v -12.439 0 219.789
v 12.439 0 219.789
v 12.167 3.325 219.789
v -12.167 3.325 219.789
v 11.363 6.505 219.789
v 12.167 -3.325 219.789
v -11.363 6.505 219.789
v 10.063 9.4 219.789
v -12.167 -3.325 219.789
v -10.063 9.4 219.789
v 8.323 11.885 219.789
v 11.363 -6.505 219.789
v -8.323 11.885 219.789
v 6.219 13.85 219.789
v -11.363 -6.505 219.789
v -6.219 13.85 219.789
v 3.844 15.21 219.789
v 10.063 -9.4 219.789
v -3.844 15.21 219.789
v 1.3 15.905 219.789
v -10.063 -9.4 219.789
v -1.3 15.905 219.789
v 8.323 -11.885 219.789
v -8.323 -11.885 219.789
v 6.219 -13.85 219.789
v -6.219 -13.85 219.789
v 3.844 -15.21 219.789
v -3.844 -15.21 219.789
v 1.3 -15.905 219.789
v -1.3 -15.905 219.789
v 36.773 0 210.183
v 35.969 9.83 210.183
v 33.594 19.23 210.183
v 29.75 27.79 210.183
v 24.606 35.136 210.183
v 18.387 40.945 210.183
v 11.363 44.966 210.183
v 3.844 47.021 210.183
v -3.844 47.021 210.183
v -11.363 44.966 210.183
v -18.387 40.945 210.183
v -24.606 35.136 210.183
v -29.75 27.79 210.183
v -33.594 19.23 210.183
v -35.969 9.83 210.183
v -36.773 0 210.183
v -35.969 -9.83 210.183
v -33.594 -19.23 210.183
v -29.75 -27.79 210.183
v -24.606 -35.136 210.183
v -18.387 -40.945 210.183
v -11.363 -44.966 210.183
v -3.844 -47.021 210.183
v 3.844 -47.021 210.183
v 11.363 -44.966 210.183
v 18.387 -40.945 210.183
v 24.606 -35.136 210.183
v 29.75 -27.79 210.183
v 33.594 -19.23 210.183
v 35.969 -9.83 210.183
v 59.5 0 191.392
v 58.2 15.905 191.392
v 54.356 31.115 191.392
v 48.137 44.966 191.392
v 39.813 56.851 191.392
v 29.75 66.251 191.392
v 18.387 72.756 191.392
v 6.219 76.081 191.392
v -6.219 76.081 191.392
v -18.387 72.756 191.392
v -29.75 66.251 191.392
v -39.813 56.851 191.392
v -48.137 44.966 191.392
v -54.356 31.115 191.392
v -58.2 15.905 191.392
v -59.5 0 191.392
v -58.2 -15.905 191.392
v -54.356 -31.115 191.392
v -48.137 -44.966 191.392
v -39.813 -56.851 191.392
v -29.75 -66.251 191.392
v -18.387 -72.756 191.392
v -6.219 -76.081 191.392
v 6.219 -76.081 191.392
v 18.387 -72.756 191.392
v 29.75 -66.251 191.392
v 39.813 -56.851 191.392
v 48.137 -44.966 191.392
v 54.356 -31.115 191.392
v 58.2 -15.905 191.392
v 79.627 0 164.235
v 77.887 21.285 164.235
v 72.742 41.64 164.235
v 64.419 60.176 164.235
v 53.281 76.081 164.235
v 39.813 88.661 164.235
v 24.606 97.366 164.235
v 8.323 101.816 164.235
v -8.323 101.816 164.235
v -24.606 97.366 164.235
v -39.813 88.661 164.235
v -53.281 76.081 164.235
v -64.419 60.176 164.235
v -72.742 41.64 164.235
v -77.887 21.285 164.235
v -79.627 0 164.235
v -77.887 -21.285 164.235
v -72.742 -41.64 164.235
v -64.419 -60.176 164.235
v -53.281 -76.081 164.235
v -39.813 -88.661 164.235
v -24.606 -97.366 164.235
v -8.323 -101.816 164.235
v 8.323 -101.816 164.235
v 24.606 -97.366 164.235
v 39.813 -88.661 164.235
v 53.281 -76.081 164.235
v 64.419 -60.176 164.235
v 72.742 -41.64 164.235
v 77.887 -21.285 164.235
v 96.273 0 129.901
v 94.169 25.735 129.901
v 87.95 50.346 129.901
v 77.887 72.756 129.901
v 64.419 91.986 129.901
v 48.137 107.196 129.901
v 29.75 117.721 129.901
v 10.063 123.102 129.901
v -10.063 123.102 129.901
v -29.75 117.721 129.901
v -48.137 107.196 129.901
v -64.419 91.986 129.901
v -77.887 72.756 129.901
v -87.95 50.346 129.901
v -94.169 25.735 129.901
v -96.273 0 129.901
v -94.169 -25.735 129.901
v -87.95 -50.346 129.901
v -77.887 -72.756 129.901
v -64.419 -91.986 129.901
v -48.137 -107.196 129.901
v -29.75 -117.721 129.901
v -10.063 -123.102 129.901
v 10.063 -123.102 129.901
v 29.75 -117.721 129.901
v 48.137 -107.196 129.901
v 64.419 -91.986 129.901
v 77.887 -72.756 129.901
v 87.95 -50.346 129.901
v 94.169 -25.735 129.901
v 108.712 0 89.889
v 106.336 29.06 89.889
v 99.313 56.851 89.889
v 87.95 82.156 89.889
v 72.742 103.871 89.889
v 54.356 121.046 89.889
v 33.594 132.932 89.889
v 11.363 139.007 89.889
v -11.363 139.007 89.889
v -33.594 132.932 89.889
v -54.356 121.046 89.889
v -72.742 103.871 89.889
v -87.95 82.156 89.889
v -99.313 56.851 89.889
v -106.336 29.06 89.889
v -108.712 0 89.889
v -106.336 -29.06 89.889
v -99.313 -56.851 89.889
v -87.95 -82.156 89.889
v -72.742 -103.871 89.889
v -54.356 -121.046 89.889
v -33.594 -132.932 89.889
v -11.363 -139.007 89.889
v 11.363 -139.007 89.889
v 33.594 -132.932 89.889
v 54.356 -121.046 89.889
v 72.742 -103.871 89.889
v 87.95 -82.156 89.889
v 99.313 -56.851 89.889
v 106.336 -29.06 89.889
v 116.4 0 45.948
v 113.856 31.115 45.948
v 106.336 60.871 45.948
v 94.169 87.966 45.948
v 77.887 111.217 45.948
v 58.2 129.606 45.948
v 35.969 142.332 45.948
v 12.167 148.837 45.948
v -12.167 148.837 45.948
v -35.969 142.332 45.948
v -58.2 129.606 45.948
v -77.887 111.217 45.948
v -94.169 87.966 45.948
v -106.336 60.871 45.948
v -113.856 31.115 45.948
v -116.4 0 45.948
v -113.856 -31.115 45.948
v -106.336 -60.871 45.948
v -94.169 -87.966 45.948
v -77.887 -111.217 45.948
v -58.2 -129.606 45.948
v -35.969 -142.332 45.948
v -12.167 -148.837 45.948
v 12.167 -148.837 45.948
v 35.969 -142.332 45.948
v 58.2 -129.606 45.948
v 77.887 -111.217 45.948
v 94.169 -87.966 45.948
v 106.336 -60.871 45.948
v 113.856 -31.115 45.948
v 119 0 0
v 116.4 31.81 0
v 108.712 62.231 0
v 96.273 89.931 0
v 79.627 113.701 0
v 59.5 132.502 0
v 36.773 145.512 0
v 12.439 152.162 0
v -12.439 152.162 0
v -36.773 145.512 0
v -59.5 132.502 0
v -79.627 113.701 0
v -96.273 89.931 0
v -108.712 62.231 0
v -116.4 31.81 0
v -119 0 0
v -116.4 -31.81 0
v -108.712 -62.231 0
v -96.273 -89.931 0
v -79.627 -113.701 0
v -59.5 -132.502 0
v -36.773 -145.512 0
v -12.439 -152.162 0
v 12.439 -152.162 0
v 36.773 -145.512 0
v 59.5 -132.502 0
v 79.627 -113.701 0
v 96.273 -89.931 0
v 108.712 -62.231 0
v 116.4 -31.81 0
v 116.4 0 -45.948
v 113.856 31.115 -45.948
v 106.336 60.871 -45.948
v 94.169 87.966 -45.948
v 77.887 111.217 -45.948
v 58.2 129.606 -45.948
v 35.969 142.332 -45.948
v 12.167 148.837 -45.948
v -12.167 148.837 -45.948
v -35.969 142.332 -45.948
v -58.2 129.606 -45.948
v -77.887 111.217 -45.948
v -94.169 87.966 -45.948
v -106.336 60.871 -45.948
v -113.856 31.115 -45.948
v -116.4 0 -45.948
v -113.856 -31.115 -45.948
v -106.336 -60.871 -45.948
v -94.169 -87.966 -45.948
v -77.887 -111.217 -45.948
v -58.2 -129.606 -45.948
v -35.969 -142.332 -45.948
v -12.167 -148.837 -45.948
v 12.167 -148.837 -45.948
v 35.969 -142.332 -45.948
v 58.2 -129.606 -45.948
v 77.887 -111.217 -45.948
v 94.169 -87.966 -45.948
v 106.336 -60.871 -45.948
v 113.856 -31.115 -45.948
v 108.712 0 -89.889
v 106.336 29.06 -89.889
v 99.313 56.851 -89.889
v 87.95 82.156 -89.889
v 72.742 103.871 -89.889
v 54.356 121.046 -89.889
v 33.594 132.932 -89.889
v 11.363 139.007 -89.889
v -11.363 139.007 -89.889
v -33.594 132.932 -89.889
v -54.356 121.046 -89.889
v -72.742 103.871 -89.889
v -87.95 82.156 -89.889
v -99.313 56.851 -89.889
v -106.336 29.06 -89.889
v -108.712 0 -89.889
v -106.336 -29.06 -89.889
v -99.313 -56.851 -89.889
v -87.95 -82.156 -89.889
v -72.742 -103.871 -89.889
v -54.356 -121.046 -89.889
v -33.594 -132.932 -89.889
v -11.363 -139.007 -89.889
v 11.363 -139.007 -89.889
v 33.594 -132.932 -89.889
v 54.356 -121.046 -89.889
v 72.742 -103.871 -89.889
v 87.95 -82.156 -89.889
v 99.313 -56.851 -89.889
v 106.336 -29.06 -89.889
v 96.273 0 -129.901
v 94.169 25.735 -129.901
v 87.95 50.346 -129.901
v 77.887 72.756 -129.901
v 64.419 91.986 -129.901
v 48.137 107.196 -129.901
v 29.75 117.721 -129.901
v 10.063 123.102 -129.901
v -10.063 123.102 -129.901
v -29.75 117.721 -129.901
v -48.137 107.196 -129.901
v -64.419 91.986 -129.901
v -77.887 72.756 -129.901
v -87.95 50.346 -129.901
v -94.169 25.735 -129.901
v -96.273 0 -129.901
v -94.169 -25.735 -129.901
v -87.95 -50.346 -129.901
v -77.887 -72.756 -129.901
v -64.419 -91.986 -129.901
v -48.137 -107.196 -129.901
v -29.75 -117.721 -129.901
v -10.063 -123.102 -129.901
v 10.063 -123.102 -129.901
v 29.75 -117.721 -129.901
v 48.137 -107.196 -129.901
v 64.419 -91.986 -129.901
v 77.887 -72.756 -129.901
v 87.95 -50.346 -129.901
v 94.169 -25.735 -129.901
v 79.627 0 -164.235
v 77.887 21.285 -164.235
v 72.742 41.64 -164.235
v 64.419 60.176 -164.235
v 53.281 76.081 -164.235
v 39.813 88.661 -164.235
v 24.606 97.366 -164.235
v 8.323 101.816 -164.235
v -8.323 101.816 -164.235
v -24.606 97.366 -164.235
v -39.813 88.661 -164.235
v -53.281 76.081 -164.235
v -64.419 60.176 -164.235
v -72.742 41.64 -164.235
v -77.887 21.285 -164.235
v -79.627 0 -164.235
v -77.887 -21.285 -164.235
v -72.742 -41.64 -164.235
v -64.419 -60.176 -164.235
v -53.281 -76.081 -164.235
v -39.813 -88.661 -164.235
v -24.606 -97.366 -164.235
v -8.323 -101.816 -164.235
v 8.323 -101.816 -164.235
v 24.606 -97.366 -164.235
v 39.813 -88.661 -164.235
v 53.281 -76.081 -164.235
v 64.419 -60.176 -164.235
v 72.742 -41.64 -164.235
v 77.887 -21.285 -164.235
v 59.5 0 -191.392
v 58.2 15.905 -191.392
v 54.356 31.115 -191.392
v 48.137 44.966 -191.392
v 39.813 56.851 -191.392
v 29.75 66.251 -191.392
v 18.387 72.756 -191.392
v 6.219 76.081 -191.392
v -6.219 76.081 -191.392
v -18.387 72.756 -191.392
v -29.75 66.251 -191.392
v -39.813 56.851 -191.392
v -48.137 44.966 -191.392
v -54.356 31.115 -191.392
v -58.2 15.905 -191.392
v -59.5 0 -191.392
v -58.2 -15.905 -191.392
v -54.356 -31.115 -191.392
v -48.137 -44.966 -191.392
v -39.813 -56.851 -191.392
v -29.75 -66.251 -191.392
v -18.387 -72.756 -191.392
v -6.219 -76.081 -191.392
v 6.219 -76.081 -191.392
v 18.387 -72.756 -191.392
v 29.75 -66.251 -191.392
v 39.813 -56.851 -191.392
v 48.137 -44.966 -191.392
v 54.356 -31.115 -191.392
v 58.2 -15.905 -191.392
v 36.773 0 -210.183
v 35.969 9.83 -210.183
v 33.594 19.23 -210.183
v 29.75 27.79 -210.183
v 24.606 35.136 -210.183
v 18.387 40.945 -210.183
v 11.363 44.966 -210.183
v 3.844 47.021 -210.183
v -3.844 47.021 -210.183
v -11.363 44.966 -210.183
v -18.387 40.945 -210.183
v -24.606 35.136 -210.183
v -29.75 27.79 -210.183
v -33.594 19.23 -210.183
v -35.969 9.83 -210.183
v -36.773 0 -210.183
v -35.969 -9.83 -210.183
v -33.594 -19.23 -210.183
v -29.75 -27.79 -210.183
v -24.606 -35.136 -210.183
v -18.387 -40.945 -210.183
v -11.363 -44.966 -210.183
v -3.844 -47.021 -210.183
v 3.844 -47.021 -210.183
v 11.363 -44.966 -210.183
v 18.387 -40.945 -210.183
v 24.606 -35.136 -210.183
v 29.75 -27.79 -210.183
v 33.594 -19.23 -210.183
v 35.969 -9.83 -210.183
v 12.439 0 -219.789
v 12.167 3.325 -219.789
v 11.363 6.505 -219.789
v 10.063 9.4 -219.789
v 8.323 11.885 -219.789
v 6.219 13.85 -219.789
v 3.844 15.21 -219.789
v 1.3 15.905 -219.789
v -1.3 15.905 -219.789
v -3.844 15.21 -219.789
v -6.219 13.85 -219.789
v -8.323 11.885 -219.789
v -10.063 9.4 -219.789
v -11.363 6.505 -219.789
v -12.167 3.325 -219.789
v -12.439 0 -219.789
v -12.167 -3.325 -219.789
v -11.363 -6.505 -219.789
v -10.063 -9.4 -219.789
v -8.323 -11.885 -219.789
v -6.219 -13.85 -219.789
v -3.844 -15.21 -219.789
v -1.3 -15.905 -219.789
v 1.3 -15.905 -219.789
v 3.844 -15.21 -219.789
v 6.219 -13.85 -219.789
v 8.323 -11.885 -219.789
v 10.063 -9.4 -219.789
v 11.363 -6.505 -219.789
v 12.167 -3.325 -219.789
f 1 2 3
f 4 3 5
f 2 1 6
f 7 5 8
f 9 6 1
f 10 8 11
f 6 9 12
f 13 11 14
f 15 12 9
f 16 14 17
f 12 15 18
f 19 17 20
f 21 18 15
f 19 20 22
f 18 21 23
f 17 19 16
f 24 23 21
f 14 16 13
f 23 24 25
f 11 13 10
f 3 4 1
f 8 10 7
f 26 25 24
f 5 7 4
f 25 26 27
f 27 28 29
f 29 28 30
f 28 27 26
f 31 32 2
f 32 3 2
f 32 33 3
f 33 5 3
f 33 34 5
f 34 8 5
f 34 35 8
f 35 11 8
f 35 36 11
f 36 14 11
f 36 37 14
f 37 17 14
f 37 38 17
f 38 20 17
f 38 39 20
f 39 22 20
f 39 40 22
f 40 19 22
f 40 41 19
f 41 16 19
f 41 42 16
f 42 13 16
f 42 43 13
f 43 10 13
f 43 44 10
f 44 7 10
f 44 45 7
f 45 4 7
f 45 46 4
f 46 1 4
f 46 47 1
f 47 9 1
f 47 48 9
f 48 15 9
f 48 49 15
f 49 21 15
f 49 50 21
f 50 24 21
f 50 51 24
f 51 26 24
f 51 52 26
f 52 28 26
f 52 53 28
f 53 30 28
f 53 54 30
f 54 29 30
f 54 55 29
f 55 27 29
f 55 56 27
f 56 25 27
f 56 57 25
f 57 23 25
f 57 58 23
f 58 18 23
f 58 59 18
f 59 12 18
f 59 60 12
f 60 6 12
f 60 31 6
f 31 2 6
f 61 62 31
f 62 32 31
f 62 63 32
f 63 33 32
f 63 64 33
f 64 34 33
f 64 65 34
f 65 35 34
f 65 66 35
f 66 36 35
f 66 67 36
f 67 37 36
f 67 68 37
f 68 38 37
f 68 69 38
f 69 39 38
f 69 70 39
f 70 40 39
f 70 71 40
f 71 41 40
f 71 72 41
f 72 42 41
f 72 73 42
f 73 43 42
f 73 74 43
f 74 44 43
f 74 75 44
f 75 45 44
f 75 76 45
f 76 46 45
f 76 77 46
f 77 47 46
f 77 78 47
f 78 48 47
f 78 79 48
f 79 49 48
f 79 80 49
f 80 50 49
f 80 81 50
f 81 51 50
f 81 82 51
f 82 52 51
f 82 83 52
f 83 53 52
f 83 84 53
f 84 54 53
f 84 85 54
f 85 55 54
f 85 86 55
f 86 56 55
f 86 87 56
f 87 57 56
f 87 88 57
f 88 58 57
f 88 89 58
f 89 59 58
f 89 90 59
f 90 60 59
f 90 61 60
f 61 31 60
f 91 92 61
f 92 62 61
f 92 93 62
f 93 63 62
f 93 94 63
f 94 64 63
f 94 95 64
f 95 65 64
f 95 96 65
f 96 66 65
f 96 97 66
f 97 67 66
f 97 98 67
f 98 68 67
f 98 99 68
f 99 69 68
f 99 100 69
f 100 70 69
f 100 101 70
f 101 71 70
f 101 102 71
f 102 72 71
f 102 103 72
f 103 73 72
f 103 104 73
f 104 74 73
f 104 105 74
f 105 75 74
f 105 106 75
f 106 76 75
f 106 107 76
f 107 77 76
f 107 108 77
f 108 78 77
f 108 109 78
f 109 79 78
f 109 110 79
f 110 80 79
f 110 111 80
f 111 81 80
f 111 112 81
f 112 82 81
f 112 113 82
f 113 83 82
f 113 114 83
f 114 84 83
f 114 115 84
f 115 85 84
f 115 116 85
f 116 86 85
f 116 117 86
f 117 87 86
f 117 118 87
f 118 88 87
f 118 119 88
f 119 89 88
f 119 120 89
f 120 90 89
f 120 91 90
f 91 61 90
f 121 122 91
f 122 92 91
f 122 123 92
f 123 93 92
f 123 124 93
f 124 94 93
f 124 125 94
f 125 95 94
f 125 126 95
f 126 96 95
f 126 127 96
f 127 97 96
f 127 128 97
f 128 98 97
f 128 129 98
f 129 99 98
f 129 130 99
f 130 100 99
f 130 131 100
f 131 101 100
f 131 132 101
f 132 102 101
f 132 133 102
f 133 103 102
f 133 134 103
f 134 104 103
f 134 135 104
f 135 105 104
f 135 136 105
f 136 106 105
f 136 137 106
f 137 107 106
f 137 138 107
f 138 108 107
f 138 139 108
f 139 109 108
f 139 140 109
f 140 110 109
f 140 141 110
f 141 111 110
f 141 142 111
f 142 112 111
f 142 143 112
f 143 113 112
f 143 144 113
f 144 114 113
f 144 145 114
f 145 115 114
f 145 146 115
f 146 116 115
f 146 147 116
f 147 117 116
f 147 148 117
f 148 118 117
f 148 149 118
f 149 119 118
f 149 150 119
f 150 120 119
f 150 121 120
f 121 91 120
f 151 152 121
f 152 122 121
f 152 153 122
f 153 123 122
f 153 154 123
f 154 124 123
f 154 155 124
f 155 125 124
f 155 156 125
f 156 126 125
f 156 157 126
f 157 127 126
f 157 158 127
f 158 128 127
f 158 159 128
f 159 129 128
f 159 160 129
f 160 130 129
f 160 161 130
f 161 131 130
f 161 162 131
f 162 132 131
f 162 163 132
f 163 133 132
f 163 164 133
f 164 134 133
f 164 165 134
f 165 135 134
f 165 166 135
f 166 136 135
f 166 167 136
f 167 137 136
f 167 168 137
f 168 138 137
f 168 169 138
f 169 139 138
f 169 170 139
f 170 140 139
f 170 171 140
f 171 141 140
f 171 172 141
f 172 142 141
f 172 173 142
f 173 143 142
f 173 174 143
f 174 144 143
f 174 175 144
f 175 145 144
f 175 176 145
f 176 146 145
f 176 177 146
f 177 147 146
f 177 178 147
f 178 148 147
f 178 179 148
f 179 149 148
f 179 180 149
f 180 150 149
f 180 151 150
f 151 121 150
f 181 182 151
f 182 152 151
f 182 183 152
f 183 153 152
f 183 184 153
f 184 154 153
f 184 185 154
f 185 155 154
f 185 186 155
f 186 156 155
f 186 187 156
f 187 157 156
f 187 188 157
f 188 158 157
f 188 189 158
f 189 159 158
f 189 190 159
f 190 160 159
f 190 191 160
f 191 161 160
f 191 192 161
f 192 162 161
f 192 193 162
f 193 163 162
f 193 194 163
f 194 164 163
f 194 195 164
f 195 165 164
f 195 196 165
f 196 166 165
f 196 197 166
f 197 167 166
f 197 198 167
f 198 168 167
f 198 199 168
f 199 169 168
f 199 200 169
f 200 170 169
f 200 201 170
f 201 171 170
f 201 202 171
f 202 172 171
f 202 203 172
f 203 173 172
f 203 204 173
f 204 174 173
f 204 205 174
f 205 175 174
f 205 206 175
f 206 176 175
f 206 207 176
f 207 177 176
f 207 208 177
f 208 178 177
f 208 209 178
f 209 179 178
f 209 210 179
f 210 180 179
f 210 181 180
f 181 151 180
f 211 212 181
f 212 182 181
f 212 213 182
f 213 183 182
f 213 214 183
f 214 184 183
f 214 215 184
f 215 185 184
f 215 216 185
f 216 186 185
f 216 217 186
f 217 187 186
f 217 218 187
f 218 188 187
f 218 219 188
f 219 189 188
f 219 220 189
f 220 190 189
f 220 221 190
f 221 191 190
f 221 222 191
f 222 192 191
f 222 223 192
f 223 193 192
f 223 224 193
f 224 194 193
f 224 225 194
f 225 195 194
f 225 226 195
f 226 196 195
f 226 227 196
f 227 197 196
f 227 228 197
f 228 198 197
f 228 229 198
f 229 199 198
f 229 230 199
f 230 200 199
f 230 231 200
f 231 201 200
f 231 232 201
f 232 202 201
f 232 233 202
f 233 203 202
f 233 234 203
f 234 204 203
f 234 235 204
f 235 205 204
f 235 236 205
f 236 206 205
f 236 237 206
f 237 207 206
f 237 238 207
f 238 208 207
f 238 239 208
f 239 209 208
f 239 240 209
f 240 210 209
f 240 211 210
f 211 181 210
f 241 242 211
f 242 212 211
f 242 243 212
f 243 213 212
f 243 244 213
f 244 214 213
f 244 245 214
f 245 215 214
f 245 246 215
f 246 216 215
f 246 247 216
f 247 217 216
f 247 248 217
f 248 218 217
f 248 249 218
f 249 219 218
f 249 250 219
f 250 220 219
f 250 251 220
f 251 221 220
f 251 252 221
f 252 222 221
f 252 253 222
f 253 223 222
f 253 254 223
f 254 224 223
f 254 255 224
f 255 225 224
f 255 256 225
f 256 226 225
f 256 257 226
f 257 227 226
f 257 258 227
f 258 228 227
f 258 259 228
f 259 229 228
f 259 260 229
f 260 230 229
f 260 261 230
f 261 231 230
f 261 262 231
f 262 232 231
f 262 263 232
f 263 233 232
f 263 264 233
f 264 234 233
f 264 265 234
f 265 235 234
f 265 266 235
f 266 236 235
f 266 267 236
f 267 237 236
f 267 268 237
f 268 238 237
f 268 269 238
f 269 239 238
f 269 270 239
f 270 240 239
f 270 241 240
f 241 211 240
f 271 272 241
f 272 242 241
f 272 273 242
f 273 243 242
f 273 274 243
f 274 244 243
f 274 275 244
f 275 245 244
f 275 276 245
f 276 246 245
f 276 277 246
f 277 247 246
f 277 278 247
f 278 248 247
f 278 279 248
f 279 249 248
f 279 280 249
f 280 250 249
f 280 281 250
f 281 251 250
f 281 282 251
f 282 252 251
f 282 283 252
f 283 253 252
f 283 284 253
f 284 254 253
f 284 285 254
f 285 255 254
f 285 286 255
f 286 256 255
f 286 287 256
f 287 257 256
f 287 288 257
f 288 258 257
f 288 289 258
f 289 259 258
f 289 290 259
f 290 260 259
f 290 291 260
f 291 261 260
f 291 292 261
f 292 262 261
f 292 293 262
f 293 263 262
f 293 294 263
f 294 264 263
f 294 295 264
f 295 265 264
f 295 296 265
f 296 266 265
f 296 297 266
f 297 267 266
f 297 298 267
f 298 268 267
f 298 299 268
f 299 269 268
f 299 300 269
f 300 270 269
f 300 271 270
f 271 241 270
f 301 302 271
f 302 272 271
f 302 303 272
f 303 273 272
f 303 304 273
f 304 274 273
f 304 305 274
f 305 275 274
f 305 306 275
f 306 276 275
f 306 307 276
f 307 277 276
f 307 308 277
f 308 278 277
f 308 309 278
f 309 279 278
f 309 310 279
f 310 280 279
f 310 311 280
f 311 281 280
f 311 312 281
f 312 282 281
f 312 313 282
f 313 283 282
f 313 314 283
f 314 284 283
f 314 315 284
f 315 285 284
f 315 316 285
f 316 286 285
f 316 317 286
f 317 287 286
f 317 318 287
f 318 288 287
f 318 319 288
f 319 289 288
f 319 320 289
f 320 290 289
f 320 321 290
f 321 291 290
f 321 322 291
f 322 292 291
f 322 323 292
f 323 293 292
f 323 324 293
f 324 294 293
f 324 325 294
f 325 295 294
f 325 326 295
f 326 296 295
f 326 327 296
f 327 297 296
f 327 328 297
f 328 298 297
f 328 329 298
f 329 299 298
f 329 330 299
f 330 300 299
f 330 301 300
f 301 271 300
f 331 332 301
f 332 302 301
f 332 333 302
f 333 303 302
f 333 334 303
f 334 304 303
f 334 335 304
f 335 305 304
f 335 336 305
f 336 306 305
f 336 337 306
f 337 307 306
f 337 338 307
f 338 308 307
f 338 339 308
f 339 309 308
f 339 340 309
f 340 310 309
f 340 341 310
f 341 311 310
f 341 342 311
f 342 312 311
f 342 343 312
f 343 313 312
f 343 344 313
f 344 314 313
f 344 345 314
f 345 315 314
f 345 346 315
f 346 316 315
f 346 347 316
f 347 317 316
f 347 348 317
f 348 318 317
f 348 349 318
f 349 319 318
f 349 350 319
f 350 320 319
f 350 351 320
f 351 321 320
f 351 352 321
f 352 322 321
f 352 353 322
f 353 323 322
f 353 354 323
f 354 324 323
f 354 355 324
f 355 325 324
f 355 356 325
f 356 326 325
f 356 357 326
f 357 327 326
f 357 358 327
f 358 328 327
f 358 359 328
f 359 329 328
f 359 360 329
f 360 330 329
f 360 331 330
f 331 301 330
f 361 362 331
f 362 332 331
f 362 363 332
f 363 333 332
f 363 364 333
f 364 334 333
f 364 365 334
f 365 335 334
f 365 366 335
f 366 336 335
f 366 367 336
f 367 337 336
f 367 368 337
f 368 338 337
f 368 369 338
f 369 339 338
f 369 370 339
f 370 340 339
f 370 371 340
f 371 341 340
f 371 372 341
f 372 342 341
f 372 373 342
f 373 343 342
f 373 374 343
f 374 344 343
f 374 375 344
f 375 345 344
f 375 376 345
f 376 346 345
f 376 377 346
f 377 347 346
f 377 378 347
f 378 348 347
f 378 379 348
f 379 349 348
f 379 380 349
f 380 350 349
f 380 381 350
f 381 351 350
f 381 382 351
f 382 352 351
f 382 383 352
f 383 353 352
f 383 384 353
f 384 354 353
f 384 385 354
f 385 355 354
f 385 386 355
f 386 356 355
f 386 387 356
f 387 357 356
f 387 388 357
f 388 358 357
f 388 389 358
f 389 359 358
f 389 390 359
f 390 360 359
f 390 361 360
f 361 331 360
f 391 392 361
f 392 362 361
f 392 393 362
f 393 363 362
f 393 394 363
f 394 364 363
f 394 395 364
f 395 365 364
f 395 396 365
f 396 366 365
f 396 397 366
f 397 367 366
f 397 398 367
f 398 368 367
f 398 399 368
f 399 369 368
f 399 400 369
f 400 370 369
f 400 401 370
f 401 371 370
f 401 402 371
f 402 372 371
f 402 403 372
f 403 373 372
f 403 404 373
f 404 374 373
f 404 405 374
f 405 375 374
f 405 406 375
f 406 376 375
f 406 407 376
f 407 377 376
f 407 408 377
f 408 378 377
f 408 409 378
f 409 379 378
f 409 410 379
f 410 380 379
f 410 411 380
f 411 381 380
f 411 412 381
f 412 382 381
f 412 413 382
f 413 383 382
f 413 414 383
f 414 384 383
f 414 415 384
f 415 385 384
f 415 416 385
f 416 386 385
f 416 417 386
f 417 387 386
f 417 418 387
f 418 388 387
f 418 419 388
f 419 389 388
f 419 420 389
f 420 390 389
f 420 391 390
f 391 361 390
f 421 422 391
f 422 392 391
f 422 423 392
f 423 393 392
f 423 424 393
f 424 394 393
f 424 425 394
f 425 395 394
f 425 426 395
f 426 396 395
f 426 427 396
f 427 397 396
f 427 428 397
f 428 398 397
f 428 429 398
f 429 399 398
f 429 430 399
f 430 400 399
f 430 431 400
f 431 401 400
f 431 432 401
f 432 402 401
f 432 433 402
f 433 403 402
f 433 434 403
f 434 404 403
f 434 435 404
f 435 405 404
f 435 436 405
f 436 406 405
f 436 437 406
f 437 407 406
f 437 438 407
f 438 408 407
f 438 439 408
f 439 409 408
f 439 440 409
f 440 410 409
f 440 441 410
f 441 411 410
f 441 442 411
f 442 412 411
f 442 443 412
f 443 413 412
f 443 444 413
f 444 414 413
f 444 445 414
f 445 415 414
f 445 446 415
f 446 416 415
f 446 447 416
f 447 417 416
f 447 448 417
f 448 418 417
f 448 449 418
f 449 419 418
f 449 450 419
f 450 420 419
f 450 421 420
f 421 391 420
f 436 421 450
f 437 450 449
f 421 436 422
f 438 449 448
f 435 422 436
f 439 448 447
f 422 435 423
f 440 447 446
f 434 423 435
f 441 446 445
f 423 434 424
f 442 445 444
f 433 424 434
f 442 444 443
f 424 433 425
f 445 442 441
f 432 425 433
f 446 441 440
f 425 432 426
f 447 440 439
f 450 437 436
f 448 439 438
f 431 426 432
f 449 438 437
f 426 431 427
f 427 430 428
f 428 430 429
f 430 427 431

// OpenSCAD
// Generated by SolidPython 1.0.1 on 2020-07-29 00:46:47


scale(v = [7, 9, 13]) {
	sphere(r = 17);
}
/***********************************************
*********      SolidPython code:      **********
************************************************
 
# import packages: SolidPython
from solid import *
from solid.utils import *
from itertools import chain, combinations, permutations


class Resize:

    def __init__(self, scad_file):
        self.scad_file = scad_file
        #self.scad_file = import_scad(scad_file)
        # cone/cylinder param:
        self.r1 = 0
        self.r2 = 0
        self.h = 0
        # rectangular prism param:
        self.w = 0
        self.l = 0
        # ellipse param:
        self.r = 0

    # import OpenScad code (file name corresponds to shape)


    # classify shape + parameters
    def assign(self, param1, param2, param3):
        if self.scad_file == 'cone.scad':
            self.r1 = param1
            self.r2 = param2
            self.h = param3
        elif self.scad_file == 'cylinder.scad':
            self.r1 = param1
            self.r2 = param2
            self.h = param3
        elif self.scad_file == 'rectangularPrism.scad':
            self.h = param1
            self.l = param2
            self.w = param3
        else:
            self.r = param1
            self.h = param2

    # resize parameters
    def iterate(self):
        x = range(3, 20, 2)
        i = 1
        if self.scad_file == 'cone.scad':
            tempList = list(permutations(x, 2))
            for temp in tempList:
                param1 = temp[0]
                param2 = temp[1]
                filepath = 'produced_scad_files/' + 'cone' + str(param1) + '_' + str(param2) + '_' + '.scad'
                scad_render_to_file(cylinder(h=param1, r1=param2, r2=0), filepath)

        elif self.scad_file == 'cylinder.scad':
            tempList = list(permutations(x, 3))
            for temp in tempList:
                param1 = temp[0]
                param2 = temp[1]
                filepath = 'produced_scad_files/' + 'cylinder' + str(param1) + '_' + str(param2) + '_' + '.scad'
                scad_render_to_file(cylinder(h=param1, r1=param2, r2=param2), filepath)

        elif self.scad_file == 'rectangularPrism.scad':
            tempList = list(permutations(x, 3))
            for temp in tempList:
                param1 = temp[0]
                param2 = temp[1]
                param3 = temp[2]
                filepath = 'produced_scad_files/' + 'rectangularPrism' + str(param1) + '_' + str(param2) + '_' + str(
                    param3) + '.scad'
                scad_render_to_file(cube(size=(param1, param2, param3)), filepath)

        elif self.scad_file == 'ellipse.scad':
            tempList = list(permutations(x, 4))
            for temp in tempList:
                param1 = temp[0]
                param2 = temp[1]
                param3 = temp[2]
                param4 = temp[3]
                filepath = 'produced_scad_files/' + 'ellipse' + str(param1) + '_' + str(param2) + '_' + str(param3) + '_' + str(param4) + '.scad'
                scad_render_to_file(scale([param1, param2, param3])(sphere(r=param4)), filepath)

    def render_to_scadfile(self):
        scad_render_to_file(scad, 'example.scad') 
 
************************************************/
